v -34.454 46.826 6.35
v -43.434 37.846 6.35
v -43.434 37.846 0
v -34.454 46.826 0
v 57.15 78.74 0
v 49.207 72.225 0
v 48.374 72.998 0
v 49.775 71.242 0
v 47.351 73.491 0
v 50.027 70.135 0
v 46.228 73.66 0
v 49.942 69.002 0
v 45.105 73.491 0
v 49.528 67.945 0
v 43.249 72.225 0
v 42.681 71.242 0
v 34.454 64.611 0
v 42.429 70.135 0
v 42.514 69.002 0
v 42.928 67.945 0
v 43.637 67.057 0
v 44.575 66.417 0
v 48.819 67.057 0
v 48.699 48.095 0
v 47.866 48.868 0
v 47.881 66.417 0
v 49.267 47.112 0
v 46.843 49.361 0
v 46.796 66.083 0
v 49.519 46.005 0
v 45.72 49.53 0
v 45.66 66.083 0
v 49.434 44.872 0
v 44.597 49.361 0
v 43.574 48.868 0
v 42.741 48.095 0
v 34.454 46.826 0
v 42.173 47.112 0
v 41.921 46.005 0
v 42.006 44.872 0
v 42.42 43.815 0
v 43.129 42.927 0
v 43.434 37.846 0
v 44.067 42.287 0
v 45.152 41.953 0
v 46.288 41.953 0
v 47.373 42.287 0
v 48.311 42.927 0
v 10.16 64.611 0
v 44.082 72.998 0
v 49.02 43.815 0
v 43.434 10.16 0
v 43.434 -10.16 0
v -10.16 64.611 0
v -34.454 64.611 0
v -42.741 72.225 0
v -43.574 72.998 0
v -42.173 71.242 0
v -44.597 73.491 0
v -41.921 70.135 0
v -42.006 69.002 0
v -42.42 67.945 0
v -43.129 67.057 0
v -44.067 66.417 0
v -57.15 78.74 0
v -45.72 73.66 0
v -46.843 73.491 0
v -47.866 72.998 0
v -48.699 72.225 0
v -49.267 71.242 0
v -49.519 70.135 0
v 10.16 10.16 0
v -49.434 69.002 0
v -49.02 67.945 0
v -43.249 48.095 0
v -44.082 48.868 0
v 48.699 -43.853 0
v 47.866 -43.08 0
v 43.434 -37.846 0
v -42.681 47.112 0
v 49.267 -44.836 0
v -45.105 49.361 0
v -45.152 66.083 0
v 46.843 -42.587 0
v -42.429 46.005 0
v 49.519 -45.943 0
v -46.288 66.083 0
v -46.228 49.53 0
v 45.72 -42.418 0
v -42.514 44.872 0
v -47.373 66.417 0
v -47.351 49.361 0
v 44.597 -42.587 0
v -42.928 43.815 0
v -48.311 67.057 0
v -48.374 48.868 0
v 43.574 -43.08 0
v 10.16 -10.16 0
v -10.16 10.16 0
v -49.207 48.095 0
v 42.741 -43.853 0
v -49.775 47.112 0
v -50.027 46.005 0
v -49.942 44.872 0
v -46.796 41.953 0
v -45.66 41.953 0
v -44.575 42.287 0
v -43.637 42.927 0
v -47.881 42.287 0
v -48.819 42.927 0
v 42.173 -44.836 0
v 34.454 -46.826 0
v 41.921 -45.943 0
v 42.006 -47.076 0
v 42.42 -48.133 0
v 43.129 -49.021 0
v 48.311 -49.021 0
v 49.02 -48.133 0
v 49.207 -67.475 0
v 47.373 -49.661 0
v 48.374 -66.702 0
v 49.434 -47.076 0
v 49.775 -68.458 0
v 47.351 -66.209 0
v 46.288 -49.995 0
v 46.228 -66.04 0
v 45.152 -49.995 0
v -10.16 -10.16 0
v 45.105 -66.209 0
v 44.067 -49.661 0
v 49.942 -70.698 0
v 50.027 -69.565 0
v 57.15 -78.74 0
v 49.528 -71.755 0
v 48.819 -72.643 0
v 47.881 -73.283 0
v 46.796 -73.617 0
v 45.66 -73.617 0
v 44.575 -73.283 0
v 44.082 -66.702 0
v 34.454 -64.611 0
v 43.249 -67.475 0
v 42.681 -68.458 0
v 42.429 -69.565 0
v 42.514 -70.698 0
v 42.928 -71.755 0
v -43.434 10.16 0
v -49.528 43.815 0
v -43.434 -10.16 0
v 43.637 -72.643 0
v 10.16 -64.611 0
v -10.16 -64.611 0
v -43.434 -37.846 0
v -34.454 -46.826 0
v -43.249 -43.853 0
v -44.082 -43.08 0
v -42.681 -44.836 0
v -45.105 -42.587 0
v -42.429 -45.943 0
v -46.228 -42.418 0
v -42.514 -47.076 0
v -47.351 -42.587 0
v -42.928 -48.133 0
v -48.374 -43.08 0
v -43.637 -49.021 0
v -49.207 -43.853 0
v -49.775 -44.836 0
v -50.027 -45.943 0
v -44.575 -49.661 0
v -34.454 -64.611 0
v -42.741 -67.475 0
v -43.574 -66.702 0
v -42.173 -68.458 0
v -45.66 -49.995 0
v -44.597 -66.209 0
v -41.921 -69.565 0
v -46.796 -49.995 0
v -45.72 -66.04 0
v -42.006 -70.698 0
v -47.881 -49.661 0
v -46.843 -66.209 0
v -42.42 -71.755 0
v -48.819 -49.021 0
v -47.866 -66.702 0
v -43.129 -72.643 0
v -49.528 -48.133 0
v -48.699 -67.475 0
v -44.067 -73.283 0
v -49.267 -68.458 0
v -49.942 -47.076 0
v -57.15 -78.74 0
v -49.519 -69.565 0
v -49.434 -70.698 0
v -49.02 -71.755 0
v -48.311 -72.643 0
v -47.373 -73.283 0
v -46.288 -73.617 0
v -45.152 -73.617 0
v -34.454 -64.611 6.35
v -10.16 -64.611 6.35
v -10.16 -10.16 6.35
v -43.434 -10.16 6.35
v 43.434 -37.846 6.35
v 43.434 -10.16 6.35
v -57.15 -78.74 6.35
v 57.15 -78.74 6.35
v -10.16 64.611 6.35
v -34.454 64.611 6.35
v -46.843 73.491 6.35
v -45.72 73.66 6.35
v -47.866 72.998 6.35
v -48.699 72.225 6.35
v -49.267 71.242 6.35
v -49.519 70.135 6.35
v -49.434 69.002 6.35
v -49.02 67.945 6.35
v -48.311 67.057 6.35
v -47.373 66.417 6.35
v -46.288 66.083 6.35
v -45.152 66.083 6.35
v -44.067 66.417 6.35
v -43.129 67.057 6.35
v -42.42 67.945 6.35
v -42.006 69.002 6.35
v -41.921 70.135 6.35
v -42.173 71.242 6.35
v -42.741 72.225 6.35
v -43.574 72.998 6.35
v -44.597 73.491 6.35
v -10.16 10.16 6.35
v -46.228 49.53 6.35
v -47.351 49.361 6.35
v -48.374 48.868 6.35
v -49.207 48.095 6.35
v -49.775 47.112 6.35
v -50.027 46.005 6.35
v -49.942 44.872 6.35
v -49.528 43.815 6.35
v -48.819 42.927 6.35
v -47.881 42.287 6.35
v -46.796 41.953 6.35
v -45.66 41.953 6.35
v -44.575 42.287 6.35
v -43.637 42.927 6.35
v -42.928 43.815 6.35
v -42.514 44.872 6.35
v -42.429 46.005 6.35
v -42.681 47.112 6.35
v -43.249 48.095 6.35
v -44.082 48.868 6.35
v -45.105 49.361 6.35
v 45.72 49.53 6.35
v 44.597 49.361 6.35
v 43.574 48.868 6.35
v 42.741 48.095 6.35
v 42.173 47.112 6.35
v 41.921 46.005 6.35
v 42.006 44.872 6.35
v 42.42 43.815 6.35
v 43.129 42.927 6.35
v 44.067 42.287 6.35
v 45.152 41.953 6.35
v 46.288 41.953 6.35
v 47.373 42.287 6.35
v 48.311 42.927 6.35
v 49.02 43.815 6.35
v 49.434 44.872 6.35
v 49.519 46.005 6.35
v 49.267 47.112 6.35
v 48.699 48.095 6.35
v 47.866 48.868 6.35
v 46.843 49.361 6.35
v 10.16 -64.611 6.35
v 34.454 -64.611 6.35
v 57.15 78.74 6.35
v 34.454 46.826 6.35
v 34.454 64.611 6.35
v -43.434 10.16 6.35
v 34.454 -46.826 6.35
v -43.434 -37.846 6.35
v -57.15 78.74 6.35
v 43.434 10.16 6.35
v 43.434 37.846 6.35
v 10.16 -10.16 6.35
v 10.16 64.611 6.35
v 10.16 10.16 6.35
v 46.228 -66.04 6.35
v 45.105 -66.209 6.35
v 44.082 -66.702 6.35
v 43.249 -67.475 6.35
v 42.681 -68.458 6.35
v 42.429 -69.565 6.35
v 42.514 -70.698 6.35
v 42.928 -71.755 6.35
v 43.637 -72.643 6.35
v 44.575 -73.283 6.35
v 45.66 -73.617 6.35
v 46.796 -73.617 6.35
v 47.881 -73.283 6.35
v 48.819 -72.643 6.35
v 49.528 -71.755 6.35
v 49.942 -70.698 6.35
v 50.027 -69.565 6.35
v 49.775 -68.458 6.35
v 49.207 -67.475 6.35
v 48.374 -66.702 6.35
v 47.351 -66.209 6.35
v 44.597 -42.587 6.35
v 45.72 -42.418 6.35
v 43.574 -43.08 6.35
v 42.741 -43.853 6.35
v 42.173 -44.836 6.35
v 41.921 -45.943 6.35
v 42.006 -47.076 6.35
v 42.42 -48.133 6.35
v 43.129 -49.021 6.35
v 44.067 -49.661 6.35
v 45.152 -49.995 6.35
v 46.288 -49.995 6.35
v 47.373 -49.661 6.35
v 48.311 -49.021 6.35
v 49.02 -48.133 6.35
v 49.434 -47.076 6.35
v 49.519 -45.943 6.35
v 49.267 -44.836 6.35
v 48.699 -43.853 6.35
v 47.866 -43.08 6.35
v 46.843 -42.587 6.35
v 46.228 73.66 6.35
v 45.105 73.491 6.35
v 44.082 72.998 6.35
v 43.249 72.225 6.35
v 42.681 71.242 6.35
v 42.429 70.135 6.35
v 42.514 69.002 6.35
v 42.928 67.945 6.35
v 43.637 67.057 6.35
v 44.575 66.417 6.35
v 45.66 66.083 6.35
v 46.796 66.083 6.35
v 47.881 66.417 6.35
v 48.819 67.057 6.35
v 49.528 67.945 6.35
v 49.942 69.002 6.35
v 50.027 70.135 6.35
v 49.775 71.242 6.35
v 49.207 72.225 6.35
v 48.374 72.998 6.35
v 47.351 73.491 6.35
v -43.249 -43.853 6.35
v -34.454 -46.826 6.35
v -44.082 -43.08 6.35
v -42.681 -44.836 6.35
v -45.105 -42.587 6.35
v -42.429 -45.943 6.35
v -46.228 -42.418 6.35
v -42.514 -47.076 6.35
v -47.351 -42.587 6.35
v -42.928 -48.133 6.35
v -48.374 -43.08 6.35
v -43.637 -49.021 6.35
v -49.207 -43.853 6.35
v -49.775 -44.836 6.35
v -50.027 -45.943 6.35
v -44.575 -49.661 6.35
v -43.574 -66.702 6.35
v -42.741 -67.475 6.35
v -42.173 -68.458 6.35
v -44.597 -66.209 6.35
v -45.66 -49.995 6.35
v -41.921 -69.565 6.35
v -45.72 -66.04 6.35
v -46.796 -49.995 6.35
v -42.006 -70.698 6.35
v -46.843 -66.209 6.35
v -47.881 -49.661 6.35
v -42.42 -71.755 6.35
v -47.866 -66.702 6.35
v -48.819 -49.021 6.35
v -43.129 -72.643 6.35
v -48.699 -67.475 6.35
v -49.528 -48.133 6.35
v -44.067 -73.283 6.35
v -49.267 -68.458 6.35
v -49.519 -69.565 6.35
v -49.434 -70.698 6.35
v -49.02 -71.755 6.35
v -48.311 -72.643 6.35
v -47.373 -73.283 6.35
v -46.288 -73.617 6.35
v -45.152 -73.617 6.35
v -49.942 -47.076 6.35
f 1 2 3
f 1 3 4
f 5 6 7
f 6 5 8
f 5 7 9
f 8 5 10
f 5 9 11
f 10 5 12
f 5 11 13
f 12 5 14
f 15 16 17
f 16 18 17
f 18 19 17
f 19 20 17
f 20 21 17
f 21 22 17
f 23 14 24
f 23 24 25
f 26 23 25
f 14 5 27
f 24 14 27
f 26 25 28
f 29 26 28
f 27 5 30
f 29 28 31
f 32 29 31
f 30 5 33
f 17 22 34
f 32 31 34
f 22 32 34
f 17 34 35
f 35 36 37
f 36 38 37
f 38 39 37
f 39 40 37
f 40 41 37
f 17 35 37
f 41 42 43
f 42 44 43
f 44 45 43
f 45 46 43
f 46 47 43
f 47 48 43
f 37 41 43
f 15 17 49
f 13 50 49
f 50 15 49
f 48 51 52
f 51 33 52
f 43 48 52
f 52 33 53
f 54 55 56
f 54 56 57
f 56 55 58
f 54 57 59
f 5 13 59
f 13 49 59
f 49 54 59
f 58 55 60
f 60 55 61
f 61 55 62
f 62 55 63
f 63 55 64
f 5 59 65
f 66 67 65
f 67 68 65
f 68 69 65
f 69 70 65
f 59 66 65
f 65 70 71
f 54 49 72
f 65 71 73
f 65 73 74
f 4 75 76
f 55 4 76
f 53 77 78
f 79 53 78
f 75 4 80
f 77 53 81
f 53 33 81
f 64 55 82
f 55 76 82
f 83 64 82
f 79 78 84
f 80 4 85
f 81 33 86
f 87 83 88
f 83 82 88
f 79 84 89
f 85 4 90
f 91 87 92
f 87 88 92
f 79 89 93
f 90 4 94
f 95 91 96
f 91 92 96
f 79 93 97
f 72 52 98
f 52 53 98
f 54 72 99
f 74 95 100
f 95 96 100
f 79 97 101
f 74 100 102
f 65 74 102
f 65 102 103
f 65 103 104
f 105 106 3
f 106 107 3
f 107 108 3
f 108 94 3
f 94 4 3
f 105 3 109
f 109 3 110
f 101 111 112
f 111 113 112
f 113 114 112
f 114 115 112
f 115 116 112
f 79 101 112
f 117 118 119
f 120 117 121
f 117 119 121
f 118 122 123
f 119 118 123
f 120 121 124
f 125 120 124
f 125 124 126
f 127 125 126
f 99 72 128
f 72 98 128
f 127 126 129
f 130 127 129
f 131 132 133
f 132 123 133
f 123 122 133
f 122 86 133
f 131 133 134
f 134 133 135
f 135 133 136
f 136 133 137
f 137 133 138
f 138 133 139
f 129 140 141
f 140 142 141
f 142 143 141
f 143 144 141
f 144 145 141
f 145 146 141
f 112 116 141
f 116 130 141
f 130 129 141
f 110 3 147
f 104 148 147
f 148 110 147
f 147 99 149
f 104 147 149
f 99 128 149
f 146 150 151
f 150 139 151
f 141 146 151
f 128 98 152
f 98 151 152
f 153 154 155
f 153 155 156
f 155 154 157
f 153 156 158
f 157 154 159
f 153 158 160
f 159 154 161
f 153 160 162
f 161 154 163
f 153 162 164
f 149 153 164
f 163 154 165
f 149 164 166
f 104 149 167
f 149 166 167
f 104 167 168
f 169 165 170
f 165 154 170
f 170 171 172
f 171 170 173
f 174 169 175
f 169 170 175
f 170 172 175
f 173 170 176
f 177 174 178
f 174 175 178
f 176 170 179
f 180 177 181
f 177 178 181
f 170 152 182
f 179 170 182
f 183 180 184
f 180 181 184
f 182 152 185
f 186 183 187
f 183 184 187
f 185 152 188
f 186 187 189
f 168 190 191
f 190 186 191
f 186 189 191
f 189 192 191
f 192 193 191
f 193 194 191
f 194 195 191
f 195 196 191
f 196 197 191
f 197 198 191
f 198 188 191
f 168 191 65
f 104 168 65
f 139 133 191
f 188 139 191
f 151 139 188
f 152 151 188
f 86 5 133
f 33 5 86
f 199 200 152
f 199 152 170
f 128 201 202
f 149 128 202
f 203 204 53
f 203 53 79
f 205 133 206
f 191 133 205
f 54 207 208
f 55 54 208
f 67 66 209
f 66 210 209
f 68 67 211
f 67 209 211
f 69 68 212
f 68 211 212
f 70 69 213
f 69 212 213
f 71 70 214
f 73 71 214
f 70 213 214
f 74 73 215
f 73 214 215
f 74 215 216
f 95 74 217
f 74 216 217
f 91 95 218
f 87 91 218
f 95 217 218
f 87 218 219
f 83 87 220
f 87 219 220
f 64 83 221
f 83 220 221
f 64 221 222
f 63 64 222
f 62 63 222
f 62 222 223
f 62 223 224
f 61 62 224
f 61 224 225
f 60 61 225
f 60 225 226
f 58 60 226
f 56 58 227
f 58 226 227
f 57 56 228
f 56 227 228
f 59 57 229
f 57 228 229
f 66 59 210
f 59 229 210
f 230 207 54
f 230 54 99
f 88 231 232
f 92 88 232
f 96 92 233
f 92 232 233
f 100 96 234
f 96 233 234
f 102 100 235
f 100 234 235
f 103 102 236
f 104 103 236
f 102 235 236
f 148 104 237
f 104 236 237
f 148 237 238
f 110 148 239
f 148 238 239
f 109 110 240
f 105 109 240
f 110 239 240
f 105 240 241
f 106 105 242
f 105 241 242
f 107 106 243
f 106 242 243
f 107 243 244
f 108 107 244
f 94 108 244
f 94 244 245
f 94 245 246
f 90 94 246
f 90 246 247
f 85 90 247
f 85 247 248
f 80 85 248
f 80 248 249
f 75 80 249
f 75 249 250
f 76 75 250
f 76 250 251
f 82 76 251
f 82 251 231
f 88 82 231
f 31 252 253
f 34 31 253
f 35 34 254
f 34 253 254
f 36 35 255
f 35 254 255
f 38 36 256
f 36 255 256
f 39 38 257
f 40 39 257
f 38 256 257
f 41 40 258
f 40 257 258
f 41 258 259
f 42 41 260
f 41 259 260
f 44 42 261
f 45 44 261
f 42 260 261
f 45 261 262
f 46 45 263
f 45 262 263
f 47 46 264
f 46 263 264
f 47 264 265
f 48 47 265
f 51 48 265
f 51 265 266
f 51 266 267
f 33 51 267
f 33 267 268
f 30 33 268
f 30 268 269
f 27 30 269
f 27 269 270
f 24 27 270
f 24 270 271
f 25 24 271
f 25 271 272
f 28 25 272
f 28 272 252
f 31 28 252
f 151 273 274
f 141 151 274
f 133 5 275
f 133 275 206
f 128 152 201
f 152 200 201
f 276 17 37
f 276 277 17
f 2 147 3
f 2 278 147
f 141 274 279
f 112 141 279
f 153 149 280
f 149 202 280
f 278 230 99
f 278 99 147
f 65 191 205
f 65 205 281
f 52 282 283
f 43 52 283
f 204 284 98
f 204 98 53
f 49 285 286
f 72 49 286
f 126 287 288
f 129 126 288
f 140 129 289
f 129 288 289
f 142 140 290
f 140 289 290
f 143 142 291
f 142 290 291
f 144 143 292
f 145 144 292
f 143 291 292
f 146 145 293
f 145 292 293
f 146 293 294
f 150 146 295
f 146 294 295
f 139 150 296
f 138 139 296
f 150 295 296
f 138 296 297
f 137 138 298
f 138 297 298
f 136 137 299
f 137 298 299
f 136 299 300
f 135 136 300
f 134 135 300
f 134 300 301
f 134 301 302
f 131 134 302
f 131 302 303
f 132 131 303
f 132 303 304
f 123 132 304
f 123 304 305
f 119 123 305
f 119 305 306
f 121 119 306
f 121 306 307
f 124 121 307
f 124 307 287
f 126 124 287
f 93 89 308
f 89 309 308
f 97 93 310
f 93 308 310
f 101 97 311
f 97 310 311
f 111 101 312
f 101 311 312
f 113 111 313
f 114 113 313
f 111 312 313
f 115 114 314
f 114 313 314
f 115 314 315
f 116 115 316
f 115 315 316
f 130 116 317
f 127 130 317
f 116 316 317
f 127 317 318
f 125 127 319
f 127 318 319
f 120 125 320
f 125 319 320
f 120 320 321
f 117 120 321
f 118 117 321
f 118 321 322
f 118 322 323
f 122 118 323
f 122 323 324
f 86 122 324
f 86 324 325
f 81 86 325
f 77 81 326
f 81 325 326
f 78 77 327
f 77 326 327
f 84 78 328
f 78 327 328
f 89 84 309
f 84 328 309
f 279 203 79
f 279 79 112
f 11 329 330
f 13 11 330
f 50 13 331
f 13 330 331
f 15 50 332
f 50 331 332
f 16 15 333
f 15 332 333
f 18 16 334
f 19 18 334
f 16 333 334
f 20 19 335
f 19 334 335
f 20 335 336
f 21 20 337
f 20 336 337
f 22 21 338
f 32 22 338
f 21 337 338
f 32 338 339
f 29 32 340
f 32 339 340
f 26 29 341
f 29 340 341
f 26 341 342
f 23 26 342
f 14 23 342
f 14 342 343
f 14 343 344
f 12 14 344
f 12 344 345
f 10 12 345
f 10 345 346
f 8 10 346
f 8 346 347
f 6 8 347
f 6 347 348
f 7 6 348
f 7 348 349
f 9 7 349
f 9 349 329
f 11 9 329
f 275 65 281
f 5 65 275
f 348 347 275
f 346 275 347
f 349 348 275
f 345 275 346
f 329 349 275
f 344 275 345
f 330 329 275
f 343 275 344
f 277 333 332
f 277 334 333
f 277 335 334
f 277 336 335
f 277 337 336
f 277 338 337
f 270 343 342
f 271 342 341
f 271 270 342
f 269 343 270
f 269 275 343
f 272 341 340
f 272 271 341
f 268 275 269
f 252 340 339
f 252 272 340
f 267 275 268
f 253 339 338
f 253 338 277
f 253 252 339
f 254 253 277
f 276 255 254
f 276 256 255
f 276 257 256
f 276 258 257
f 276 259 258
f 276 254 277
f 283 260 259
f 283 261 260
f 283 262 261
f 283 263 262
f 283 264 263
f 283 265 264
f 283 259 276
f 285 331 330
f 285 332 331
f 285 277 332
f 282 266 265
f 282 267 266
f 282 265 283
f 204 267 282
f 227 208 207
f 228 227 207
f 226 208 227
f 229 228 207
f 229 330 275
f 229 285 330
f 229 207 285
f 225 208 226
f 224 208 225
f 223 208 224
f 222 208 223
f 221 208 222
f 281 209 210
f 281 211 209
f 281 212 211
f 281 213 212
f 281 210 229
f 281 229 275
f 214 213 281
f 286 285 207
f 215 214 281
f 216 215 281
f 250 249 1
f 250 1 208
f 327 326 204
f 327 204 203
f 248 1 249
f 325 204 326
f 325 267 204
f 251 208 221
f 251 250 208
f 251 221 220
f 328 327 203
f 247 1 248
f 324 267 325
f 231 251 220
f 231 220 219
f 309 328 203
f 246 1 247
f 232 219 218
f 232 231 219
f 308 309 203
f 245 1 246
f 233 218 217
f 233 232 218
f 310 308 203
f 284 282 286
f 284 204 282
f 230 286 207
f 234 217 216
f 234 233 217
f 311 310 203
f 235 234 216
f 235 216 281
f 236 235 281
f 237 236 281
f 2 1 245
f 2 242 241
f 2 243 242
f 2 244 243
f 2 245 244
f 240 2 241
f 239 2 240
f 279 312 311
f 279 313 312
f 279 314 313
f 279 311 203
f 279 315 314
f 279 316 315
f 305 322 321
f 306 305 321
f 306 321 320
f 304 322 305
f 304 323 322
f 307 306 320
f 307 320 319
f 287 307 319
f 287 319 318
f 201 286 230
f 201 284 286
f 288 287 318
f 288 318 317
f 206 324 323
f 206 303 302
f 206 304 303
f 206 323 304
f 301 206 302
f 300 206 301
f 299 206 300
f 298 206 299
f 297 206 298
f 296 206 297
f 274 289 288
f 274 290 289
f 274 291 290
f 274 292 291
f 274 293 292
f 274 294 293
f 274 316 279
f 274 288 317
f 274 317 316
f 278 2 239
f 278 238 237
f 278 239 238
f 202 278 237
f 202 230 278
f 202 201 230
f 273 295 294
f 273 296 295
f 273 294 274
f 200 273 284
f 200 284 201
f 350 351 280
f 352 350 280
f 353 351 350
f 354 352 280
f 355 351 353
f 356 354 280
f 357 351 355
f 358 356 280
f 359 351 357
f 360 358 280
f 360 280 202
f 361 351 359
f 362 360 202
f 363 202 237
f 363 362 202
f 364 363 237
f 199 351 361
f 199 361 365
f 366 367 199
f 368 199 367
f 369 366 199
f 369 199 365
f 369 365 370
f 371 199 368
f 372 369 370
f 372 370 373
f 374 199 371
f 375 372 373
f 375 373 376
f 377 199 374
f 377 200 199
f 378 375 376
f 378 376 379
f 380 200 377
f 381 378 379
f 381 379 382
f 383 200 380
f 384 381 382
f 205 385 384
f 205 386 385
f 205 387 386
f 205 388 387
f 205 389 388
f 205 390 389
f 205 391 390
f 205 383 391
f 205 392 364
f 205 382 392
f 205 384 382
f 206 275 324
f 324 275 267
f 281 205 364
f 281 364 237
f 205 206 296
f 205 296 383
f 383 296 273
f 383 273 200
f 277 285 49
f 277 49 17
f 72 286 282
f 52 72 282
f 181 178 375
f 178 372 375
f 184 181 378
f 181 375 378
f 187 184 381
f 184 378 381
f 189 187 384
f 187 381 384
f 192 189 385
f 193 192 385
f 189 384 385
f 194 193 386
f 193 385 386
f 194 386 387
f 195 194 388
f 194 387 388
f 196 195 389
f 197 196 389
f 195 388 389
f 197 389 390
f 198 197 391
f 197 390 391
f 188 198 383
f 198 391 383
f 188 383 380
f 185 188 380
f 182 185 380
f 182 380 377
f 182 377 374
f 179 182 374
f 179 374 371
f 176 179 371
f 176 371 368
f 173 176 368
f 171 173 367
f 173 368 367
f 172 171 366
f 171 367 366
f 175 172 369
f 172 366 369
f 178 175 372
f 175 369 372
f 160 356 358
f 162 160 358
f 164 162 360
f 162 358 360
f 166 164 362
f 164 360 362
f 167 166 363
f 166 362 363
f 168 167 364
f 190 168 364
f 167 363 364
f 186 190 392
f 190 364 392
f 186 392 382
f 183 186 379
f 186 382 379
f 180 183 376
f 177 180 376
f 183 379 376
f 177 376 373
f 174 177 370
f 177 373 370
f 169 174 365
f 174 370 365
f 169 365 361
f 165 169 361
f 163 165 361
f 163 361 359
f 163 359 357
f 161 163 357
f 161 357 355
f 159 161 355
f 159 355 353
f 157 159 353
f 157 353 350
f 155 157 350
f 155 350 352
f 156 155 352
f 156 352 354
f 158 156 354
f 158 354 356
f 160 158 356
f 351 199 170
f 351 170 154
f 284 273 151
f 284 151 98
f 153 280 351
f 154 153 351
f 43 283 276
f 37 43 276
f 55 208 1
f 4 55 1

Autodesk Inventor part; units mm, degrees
ref_plane "YZ Plane" through (0, 0, 0) normal (1, 0, 0) x (0, 1, 0)
ref_plane "XZ Plane" through (0, 0, 0) normal (0, 1, 0) x (-1, 0, 0)
ref_plane "XY Plane" through (0, 0, 0) normal (0, 0, 1) x (1, 0, 0)
sketch "Sketch1" plane through (0, 0, 0) normal (0, 0, 1) x (-1, 0, 0)
  line L0 (-57.15, 78.74) -> (57.15, 78.74)
  line L1 (57.15, 78.74) -> (57.15, -78.74)
  line L2 (57.15, -78.74) -> (-57.15, -78.74)
  line L3 (-57.15, -78.74) -> (-57.15, 78.74)
  line L4 (-57.15, 78.74) -> (57.15, -78.74) construction
  line L5 (57.15, 78.74) -> (-57.15, -78.74) construction
  point P0 (0, 0)
  dimension "d0" = 114.3
  dimension "d1" = 157.48
extrude "Extrusion1" add sketch "Sketch1" along normal blind 6.35
sketch "Sketch2" plane through (0, 0, 0) normal (0, 0, 1) x (1, 0, 0)
  line L0 (0, 106.68) -> (0, -106.68)
  line L1 (72.898, -1.6229) -> (-72.898, -1.6229)
  line L2 (0, -106.68) -> (0, 106.68)
  line L3 (-102.0572, 0) -> (102.0572, 0) projected
  point P0 (45.72, 45.72)
  point P1 (-46.228, 45.72)
  point P2 (45.72, -46.228)
  point P3 (-46.228, -46.228)
  point P4 (-45.72, 69.85)
  point P5 (-45.72, -69.85)
  point P6 (46.228, 69.85)
  point P7 (46.228, -69.85)
  dimension "d18" = 91.948
  dimension "d21" = 91.948
  dimension "d25" = 45.72
  dimension "d28" = 139.7
  dimension "d31" = 91.948
  dimension "d34" = 69.85
hole "Hole1" at (45.72, 45.72, 0) at (-46.228, 45.72, 0) at (-46.228, -46.228, 0) at (45.72, -46.228, 0) at (-45.72, 69.85, 0) at (46.228, 69.85, 0) at (-45.72, -69.85, 0) at (46.228, -69.85, 0) direction (0, 0, 1) diameter 7.62 end through all
sketch "Sketch6" plane through (0, 0, 6.35) normal (0, 0, 1) x (1, 0, 0)
  line L0 (-10.16, 10.16) -> (-43.434, 10.16)
  line L1 (-43.434, 10.16) -> (-43.434, 37.846)
  line L2 (-43.434, 37.846) -> (-10.16, 37.846)
  line L3 (-10.16, 37.846) -> (-10.16, 10.16)
  line L4 (-80.01, 0) -> (80.01, 0) projected
  line L5 (0, -110.236) -> (0, 110.236) projected
  line L6 (-43.434, 37.846) -> (-11.5677, 37.846) construction
  line L7 (-43.434, 37.846) -> (-7.62, 37.846) construction
  line L8 (-43.434, 37.846) -> (-34.4537, 46.8263)
  line L9 (-43.434, 37.846) -> (-30.734, 37.846) construction
  line L10 (-34.4537, 46.8263) -> (-10.16, 46.8263)
  line L11 (-10.16, 46.8263) -> (-10.16, 64.6111)
  line L12 (-10.16, 64.6111) -> (-34.4537, 64.6111)
  line L13 (-34.4537, 64.6111) -> (-34.4537, 46.8263)
  line L14 (-10.16, 46.8263) -> (-10.16, 37.846)
  line L15 (10.16, 10.16) -> (43.434, 10.16)
  line L16 (43.434, 10.16) -> (43.434, 37.846)
  line L17 (43.434, 37.846) -> (10.16, 37.846)
  line L18 (10.16, 37.846) -> (10.16, 10.16)
  line L19 (43.434, 37.846) -> (11.5677, 37.846) construction
  line L20 (43.434, 37.846) -> (7.62, 37.846) construction
  line L21 (43.434, 37.846) -> (34.4537, 46.8263)
  line L22 (43.434, 37.846) -> (30.734, 37.846) construction
  line L23 (34.4537, 46.8263) -> (10.16, 46.8263)
  line L24 (10.16, 46.8263) -> (10.16, 64.6111)
  line L25 (10.16, 64.6111) -> (34.4537, 64.6111)
  line L26 (34.4537, 64.6111) -> (34.4537, 46.8263)
  line L27 (10.16, 46.8263) -> (10.16, 37.846)
  line L28 (-10.16, -10.16) -> (-43.434, -10.16)
  line L29 (-43.434, -10.16) -> (-43.434, -37.846)
  line L30 (-43.434, -37.846) -> (-10.16, -37.846)
  line L31 (-10.16, -37.846) -> (-10.16, -10.16)
  line L32 (-43.434, -37.846) -> (-11.5677, -37.846) construction
  line L33 (-43.434, -37.846) -> (-7.62, -37.846) construction
  line L34 (-43.434, -37.846) -> (-34.4537, -46.8263)
  line L35 (-43.434, -37.846) -> (-30.734, -37.846) construction
  line L36 (-34.4537, -46.8263) -> (-10.16, -46.8263)
  line L37 (-10.16, -46.8263) -> (-10.16, -64.6111)
  line L38 (-10.16, -64.6111) -> (-34.4537, -64.6111)
  line L39 (-34.4537, -64.6111) -> (-34.4537, -46.8263)
  line L40 (-10.16, -46.8263) -> (-10.16, -37.846)
  line L41 (10.16, -10.16) -> (43.434, -10.16)
  line L42 (43.434, -10.16) -> (43.434, -37.846)
  line L43 (10.16, -37.846) -> (10.16, -10.16)
  line L44 (43.434, -37.846) -> (10.16, -37.846)
  line L45 (43.434, -37.846) -> (11.5677, -37.846) construction
  line L46 (43.434, -37.846) -> (30.734, -37.846) construction
  line L47 (10.16, -46.8263) -> (10.16, -37.846)
  line L48 (34.4537, -46.8263) -> (10.16, -46.8263)
  line L49 (43.434, -37.846) -> (34.4537, -46.8263)
  line L50 (10.16, -46.8263) -> (10.16, -64.6111)
  line L51 (10.16, -64.6111) -> (34.4537, -64.6111)
  line L52 (34.4537, -64.6111) -> (34.4537, -46.8263)
  line L53 (43.434, -37.846) -> (7.62, -37.846) construction
  point P0 (0, 0)
  dimension "d41" = 10.16
  dimension "d42" = 10.16
  dimension "d43" = 43.434
  dimension "d44" = 37.846
  dimension "d54" = 12.7
  dimension "d55" = 45
extrude "Extrusion3" cut sketch "Sketch6" against normal blind 25.4
equation "\"d12\" = d18"
properties part number "MotorAdapter"
